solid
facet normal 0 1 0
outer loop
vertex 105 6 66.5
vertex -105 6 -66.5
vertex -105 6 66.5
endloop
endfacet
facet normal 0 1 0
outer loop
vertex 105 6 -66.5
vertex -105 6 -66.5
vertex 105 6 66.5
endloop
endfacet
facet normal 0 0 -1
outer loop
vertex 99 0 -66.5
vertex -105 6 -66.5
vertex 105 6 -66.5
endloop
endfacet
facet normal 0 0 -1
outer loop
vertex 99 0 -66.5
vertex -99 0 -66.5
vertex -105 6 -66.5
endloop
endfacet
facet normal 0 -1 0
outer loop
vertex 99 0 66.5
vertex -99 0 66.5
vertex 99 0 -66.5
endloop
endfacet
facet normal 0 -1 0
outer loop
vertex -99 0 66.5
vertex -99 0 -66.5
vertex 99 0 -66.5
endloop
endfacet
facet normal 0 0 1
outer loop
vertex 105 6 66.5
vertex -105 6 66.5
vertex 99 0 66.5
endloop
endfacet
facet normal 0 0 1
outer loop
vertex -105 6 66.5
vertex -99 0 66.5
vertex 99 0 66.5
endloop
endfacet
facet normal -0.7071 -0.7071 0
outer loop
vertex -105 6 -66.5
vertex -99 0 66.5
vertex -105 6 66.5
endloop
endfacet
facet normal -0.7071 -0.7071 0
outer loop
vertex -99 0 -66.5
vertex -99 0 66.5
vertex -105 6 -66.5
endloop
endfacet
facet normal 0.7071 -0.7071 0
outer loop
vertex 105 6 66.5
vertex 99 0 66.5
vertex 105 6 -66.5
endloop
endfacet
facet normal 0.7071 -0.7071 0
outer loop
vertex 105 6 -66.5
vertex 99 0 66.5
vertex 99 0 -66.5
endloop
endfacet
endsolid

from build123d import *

# Parameters (mm, degrees)
SKETCH1_W           = 210
SKETCH1_H           = 133
BOSS_EXTRUDE1_DEPTH = 6
CHAMFER1_SIZE       = 6


with BuildPart() as part:
    # Sketch1 → Boss-Extrude1 (new body)
    with BuildSketch(Plane(origin=(0, 0, 0), x_dir=(1, 0, 0), z_dir=(0, 1, 0))):
        Rectangle(SKETCH1_W, SKETCH1_H)
    extrude(amount=BOSS_EXTRUDE1_DEPTH)

    # Chamfer1
    chamfer1_edges = [part.edges().sort_by_distance(p)[0] for p in [
        (105, 0, 0),
        (-105, 0, 0),
    ]]
    chamfer(chamfer1_edges, length=CHAMFER1_SIZE - 0.0001)  # a hair under: the kernel refuses the full size


solid = part.part
